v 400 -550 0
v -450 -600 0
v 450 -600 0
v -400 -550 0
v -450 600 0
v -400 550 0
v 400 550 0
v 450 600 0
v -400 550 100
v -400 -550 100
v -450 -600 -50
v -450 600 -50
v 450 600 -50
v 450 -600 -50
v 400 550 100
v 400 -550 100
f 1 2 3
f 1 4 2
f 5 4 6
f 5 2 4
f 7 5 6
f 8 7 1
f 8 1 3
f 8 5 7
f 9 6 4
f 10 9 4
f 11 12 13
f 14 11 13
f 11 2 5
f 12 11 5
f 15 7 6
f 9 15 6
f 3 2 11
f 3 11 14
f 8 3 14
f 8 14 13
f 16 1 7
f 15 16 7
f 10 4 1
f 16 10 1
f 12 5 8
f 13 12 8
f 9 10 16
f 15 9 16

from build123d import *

# Parameters (mm, degrees)
F0_W     = 900
F0_H     = 1200
F1_DEPTH = 50
F3_DEPTH = 100


# Not quite as in the source:
# - the program builds the solid bodies; features that only make, move or delete a surface that nothing else refers to are left out


with BuildPart() as f1:
    # F0 (on Top) → F1 (new body)
    with BuildSketch(Plane.XY):
        Rectangle(F0_W, F0_H)
    extrude(amount=-F1_DEPTH)

    # F2 (on face) → F3 (join)
    with BuildSketch(Plane.XY):
        with BuildLine():
            Line((-400.0000059605, -525), (-400.0000059605, -550))
            Line((-400.0000059605, -550), (-375.0000059605, -550))
            ThreePointArc((-375.0000059605, -550), (-382.3223364308, -532.3223304703), (-400.0000059605, -525))
        make_face()
        with BuildLine():
            ThreePointArc((-400.0000059605, -525), (-382.3223364308, -532.3223304703), (-375.0000059605, -550))
            Line((-375.0000059605, -550), (375, -550))
            ThreePointArc((375, -550), (382.3223304703, -532.3223304703), (400, -525))
            Line((400, -525), (400, 550))
            Line((400, 550), (-400.0000059605, 550))
            Line((-400.0000059605, 550), (-400.0000059605, -525))
        make_face()
        with BuildLine():
            ThreePointArc((400, -525), (382.3223304703, -532.3223304703), (375, -550))
            Line((375, -550), (400, -550))
            Line((400, -550), (400, -525))
        make_face()
    extrude(amount=F3_DEPTH)


solid = f1.part
